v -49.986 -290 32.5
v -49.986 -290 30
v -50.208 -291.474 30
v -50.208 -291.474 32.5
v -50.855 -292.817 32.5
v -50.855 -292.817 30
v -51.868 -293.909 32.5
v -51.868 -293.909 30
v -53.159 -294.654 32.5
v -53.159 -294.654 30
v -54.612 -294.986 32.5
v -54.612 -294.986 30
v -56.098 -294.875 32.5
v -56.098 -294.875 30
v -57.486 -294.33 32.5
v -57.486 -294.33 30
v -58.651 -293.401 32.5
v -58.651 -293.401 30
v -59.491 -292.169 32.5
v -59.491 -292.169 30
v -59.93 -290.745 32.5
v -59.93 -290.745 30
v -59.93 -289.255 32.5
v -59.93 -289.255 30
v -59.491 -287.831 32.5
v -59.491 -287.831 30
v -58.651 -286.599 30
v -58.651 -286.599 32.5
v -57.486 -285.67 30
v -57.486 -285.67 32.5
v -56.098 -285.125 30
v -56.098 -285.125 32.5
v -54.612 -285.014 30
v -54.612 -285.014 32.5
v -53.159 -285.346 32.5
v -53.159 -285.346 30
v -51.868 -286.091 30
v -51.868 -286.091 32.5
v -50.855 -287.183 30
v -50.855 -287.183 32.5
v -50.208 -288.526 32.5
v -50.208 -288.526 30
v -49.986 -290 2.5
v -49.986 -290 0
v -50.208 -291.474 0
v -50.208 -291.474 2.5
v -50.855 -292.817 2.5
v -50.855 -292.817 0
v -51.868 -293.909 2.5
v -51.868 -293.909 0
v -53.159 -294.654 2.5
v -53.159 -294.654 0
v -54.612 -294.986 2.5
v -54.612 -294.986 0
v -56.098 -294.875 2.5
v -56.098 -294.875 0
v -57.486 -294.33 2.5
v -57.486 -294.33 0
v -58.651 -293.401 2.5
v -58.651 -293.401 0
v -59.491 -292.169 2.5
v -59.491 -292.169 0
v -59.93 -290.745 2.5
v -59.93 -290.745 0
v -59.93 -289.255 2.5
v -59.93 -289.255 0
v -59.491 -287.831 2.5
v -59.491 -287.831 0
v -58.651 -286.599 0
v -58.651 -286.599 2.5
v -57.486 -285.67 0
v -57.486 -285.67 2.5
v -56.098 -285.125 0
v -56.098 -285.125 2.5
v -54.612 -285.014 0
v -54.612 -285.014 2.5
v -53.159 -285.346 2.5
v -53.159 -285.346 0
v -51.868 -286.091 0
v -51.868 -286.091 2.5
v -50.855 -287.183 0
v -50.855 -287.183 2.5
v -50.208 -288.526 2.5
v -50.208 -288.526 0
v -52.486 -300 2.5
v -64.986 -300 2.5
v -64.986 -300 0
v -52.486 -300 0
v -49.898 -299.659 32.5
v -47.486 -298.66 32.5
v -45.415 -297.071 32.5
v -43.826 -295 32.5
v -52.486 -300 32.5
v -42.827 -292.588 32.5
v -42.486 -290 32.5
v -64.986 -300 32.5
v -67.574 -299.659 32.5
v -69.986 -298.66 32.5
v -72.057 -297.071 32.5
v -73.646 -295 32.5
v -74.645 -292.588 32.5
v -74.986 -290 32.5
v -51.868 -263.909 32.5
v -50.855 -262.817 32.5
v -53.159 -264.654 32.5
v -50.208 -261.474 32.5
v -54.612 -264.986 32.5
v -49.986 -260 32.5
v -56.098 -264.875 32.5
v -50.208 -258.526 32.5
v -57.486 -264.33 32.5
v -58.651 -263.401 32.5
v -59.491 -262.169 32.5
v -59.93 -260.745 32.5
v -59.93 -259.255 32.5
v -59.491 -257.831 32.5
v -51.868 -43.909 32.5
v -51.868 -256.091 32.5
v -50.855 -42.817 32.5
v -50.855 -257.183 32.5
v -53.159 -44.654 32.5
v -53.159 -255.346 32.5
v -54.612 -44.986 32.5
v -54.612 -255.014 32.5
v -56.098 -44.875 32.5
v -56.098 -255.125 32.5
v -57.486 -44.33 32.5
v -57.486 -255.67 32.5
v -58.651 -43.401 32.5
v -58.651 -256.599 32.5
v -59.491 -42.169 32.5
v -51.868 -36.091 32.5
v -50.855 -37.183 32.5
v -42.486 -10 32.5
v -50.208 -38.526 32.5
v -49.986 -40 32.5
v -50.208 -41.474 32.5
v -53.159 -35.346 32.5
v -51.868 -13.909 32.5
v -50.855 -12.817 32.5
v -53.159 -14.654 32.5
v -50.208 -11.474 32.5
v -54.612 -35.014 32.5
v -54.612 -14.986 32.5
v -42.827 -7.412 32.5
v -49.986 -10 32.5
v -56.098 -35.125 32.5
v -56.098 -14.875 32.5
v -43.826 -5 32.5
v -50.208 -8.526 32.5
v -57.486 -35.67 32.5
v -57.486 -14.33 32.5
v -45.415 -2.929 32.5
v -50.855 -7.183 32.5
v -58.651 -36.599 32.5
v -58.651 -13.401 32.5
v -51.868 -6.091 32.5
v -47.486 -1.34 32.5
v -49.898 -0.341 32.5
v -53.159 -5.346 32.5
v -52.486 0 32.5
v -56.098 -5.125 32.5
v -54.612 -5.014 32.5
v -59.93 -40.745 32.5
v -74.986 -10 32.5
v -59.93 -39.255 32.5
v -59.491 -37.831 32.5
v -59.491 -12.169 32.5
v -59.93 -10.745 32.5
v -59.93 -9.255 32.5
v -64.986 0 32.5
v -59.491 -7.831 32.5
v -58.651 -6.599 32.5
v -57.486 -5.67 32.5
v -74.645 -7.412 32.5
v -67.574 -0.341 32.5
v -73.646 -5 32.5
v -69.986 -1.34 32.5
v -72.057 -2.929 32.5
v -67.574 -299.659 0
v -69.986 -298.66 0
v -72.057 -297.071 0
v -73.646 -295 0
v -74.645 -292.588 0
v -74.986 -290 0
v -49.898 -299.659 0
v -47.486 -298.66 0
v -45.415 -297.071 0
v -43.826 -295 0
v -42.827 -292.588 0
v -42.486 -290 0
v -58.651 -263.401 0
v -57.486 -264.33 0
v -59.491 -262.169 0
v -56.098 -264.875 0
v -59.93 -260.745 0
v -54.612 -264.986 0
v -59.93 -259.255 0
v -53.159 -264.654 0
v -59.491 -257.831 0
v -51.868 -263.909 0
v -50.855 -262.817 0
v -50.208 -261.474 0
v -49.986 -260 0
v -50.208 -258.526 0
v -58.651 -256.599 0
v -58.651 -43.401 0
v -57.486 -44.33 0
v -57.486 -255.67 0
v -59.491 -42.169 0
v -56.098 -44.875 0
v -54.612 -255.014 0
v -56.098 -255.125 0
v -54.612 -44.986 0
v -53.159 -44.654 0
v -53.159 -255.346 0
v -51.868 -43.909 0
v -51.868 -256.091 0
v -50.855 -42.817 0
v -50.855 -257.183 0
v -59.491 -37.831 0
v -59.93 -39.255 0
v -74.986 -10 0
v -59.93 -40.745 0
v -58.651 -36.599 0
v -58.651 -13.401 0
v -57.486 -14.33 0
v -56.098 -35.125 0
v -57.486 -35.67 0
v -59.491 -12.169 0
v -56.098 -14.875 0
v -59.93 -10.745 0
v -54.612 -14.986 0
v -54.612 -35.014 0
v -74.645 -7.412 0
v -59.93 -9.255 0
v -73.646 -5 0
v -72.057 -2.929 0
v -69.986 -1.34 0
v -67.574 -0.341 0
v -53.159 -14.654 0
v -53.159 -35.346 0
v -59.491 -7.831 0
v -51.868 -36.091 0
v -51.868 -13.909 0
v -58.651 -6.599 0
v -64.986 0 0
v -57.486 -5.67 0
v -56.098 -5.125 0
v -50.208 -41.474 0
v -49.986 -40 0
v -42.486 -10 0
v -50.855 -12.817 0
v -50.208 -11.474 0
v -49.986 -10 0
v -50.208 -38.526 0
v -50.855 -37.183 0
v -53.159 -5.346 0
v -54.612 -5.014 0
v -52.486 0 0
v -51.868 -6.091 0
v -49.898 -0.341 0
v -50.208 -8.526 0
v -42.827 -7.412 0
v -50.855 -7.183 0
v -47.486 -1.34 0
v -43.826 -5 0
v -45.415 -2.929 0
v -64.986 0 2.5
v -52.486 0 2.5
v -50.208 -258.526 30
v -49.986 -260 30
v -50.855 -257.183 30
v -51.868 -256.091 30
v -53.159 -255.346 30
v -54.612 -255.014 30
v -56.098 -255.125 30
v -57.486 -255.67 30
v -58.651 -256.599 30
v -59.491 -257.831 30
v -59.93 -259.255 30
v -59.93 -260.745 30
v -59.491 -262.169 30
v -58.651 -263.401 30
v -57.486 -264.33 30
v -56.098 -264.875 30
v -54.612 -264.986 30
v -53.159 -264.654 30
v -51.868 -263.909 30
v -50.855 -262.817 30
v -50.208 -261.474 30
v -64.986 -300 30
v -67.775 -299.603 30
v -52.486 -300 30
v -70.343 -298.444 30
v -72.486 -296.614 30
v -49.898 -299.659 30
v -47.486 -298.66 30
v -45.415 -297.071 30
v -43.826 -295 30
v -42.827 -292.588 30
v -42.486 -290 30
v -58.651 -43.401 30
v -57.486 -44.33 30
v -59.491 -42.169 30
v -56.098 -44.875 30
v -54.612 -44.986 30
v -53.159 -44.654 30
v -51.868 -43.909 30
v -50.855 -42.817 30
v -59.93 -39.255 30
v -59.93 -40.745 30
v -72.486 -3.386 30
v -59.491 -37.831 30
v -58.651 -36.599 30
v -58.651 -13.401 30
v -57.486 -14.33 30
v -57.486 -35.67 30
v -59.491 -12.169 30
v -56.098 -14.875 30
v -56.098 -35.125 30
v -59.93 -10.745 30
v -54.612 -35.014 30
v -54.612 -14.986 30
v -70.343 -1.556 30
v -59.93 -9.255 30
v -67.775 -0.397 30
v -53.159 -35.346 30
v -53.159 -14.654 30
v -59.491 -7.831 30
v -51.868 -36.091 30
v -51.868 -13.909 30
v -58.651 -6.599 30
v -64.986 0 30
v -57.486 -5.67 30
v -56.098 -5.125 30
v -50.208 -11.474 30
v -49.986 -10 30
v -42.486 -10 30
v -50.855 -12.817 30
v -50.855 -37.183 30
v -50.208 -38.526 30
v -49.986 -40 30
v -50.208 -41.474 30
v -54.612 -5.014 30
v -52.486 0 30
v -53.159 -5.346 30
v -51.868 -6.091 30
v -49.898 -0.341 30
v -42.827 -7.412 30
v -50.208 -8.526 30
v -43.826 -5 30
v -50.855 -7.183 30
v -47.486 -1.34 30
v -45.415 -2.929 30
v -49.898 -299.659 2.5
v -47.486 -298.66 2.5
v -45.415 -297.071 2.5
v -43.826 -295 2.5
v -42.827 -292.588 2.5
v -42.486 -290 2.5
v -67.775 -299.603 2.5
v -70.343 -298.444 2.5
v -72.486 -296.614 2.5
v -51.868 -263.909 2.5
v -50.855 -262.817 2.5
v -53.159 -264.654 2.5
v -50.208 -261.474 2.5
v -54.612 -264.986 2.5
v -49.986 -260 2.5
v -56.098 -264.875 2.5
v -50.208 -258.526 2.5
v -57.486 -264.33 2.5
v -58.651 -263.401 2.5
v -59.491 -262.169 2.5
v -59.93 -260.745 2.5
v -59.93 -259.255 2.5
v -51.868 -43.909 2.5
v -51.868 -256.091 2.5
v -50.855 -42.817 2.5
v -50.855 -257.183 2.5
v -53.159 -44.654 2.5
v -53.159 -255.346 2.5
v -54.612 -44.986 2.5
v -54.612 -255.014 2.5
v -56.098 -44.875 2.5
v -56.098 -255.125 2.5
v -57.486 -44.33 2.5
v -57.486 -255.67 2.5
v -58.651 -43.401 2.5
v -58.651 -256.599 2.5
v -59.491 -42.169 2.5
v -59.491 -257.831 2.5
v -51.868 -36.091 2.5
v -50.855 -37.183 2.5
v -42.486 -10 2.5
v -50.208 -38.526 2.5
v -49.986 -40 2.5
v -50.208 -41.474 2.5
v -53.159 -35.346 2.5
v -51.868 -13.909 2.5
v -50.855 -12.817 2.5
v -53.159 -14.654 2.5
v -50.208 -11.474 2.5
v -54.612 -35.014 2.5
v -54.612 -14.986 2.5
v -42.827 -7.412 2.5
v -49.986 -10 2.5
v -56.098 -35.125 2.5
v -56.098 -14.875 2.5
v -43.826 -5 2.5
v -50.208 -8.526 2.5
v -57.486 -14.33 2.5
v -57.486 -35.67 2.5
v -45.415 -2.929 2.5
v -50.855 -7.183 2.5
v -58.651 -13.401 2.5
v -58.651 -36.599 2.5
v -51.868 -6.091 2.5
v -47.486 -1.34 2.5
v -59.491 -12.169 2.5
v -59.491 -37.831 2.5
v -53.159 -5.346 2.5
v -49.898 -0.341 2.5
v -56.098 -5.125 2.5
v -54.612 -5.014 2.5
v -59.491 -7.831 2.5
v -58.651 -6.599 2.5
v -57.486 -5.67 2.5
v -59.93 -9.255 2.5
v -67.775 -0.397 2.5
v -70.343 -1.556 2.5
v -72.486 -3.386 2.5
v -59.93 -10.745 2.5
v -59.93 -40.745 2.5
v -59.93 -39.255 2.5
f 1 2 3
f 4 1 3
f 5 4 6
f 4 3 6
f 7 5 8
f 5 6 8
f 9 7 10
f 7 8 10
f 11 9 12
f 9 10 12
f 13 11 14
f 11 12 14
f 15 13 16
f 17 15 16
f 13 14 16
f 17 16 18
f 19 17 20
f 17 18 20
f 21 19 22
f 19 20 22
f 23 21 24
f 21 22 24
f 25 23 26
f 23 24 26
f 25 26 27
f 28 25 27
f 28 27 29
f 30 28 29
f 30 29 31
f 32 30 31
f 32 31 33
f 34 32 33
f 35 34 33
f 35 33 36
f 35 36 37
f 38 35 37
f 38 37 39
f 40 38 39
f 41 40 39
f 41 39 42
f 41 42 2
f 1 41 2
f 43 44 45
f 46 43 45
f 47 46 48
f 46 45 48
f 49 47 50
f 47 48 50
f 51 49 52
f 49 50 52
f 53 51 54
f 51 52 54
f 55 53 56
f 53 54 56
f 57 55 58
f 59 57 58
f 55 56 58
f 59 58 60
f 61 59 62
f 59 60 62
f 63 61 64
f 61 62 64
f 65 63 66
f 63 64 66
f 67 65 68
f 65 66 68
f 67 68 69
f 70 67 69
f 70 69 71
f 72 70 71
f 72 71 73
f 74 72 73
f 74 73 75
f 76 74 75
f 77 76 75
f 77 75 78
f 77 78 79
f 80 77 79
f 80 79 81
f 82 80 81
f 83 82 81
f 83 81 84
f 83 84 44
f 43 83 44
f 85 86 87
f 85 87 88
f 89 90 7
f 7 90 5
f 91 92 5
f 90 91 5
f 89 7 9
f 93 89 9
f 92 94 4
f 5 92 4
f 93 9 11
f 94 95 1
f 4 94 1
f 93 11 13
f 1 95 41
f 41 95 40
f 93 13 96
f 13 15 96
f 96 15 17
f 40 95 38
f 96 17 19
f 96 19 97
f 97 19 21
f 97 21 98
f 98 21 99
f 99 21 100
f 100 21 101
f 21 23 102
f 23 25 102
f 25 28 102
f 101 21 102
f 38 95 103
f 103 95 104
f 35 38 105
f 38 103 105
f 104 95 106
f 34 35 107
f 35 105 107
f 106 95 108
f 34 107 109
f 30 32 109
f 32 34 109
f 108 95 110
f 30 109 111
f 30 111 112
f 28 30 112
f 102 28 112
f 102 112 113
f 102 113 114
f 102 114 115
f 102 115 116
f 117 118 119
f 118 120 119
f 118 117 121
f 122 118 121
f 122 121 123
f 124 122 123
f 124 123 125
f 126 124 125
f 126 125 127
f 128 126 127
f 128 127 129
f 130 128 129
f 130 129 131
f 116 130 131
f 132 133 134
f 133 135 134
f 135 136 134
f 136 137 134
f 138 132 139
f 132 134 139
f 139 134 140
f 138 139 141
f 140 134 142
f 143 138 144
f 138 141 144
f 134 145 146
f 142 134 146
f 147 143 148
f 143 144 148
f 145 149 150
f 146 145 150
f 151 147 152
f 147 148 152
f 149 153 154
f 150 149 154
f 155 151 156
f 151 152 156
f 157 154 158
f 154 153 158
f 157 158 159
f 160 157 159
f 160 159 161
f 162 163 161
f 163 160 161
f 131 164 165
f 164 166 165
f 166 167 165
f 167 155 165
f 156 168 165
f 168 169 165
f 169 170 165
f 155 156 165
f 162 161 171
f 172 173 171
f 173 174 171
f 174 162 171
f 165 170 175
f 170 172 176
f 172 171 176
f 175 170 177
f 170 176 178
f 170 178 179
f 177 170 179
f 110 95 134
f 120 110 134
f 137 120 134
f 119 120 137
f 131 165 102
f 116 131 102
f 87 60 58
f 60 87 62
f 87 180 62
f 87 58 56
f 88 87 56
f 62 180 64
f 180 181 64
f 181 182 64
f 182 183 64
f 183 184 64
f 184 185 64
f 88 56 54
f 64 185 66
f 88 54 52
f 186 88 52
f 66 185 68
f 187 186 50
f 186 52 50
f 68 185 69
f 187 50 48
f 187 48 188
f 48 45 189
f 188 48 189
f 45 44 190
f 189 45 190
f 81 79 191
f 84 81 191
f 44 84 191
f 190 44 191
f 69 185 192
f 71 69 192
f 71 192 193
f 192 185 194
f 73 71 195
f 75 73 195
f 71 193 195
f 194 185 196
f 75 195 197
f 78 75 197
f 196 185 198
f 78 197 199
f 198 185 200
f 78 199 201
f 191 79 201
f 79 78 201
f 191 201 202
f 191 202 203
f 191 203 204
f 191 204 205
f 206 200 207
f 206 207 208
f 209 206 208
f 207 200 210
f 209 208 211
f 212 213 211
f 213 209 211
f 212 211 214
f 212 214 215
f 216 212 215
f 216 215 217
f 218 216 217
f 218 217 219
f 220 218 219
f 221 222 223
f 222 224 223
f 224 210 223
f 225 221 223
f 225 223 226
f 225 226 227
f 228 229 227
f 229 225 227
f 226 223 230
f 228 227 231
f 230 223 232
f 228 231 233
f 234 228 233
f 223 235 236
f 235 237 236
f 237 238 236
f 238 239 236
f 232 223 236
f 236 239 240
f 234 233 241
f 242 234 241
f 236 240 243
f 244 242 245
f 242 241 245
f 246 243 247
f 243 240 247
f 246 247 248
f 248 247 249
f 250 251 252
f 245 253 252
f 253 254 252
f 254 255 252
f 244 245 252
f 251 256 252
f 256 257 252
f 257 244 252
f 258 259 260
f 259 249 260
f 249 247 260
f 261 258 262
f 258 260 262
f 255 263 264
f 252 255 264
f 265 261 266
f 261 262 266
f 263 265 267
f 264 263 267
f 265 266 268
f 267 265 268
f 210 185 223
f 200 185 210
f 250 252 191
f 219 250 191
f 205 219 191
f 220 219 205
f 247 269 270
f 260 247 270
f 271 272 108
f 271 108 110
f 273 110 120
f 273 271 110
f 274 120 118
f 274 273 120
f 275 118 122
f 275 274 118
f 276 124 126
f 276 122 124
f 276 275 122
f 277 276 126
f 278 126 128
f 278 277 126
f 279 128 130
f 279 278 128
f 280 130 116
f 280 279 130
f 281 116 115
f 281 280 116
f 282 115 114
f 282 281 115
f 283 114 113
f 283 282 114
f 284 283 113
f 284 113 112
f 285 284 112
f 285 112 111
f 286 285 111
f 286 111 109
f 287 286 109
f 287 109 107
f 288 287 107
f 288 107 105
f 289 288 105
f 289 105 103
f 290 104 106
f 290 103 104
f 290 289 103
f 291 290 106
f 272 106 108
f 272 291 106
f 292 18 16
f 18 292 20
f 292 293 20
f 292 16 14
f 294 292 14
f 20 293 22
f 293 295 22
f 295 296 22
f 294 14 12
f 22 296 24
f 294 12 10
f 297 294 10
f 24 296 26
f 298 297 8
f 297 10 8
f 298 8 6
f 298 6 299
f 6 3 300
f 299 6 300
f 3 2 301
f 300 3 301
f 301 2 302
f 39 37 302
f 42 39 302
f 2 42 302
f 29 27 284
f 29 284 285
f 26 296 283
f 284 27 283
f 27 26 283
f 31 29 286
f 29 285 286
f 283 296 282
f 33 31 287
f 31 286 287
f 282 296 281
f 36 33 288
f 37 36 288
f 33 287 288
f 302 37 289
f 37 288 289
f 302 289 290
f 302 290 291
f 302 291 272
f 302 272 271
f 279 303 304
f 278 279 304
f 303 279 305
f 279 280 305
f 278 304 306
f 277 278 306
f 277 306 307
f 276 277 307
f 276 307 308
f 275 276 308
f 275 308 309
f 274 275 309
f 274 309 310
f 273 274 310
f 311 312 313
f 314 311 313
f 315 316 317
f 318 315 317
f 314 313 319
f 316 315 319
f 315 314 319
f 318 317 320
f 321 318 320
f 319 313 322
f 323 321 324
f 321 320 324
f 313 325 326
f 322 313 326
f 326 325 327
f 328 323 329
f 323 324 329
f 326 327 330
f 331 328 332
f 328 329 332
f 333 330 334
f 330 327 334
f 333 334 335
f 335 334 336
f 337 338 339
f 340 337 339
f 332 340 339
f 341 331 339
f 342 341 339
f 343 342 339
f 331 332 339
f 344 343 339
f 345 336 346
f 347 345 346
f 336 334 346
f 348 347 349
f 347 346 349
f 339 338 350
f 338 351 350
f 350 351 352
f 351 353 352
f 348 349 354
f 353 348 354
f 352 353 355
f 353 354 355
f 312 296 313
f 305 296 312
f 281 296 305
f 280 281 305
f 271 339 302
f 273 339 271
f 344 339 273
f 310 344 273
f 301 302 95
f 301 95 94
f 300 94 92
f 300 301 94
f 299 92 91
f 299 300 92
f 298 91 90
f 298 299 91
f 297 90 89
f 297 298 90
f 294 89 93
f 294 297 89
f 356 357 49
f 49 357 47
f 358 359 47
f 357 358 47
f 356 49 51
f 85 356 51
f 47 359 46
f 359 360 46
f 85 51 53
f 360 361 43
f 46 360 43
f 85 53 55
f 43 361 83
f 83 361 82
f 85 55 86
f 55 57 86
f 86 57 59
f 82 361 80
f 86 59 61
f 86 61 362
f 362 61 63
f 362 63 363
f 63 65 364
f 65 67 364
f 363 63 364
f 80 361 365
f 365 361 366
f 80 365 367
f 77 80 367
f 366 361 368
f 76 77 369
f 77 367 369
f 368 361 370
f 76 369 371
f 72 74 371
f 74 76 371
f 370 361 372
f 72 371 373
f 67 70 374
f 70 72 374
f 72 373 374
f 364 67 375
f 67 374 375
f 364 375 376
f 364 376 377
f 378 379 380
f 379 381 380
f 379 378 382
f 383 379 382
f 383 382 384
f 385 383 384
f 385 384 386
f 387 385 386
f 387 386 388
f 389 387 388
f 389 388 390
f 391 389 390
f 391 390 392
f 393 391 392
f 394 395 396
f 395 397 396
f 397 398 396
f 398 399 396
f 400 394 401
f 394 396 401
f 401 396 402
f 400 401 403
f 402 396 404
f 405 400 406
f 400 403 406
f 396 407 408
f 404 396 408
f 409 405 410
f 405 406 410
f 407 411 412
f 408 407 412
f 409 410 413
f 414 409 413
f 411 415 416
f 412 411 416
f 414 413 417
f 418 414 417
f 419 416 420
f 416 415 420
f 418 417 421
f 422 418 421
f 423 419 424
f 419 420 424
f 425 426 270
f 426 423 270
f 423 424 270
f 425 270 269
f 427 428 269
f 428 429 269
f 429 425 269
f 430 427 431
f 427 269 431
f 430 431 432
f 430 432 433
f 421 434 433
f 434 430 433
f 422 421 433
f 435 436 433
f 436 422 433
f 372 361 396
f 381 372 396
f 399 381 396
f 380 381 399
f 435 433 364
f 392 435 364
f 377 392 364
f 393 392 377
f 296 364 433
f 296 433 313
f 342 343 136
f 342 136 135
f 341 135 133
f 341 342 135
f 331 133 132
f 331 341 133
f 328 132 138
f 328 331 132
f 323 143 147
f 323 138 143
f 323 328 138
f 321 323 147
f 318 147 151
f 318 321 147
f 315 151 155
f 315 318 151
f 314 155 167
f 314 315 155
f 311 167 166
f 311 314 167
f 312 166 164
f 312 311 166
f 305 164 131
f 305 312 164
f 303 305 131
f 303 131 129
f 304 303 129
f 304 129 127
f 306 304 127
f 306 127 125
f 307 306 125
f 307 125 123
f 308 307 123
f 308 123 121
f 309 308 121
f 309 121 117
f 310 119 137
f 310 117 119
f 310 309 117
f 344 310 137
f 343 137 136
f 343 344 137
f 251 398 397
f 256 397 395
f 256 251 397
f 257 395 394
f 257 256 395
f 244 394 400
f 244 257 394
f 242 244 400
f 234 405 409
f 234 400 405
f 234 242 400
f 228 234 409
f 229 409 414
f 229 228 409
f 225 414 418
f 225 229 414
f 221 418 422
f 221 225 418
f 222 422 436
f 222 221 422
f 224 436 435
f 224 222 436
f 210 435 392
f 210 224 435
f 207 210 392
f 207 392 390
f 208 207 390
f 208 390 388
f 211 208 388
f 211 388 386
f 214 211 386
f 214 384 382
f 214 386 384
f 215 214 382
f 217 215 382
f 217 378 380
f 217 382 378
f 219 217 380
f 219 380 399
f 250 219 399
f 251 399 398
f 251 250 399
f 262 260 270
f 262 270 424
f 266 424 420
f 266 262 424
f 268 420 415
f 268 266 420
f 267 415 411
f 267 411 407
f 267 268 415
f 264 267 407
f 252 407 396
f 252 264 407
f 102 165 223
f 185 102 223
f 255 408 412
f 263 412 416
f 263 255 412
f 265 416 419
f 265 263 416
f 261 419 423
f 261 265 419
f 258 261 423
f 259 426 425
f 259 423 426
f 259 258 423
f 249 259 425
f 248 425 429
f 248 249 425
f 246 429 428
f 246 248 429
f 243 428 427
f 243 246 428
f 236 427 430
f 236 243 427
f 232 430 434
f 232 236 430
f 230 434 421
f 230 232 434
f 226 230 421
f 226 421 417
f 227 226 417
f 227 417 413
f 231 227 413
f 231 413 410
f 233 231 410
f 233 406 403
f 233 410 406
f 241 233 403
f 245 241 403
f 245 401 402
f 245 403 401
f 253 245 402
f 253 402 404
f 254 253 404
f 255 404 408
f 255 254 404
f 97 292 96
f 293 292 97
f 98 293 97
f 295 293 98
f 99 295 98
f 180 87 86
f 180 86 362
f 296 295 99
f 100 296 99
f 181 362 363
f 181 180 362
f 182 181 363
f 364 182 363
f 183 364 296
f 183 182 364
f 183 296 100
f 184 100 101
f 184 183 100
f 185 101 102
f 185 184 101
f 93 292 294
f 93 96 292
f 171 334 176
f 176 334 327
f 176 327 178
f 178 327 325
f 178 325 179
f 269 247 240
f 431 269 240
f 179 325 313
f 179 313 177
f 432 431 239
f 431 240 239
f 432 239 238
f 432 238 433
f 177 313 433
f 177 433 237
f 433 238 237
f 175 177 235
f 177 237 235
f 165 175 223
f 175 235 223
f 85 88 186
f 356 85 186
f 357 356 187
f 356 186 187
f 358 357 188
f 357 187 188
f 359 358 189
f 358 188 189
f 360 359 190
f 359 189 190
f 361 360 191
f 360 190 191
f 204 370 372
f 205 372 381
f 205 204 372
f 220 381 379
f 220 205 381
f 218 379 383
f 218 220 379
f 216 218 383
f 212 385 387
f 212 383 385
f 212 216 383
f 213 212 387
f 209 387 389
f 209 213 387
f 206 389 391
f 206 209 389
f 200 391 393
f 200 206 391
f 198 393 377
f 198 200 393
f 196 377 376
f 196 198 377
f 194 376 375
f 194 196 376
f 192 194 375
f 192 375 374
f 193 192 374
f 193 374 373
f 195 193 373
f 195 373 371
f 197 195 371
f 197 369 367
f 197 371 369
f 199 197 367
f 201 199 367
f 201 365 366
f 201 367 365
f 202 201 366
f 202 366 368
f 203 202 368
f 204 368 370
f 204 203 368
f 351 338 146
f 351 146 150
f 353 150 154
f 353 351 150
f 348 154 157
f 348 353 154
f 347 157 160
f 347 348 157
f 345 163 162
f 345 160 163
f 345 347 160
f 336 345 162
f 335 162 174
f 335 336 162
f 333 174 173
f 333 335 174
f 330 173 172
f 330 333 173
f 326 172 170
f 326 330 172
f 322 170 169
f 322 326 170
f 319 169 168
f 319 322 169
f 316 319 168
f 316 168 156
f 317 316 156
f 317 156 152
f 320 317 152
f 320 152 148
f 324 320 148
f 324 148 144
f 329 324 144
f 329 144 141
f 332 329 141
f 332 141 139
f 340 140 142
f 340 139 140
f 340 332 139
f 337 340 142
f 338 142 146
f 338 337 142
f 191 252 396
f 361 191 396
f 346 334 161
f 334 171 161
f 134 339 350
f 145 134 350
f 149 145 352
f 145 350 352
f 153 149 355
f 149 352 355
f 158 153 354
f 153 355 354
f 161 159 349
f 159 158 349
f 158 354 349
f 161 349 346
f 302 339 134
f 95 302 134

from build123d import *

# Parameters (mm, degrees)
F2_DEPTH    = 300
F1_R        = 5
F3_DEPTH    = 46
F4_T1_DEPTH = 52.5
F4_T3_DEPTH = 52.5
F4_T5_DEPTH = 82.5


# Not quite as in the source:
# - a fillet or chamfer that OpenCascade refuses, or shapes differently, is made with other operations: its cross-section is extruded or revolved along the edge and cut away or added
# - a pattern or mirror of a feature is missing from the dataset's text; its kind, count and spacing are read off the source's solid


with BuildPart() as f2:
    # F0 (on Front) → F2 (new body)
    with BuildSketch(Plane.XZ):
        Polygon((-74.9858543277, 32.5), (-74.9858543277, 0), (-42.4858543277, 0), (-42.4858543277, 2.5), (-72.4858543277, 2.5), (-72.4858543277, 30), (-42.4858543277, 30), (-42.4858543277, 32.5), align=None)
    extrude(amount=F2_DEPTH)

    # F1 (on Top) → F3 (cut)
    with BuildSketch(Plane.XY):
        with Locations((-54.9858543277, -260)):
            Circle(F1_R)
        with Locations((-54.9858543277, -40)):
            Circle(F1_R)
        with Locations((-54.9858543277, -10)):
            Circle(F1_R)
    f3 = extrude(amount=F3_DEPTH, mode=Mode.SUBTRACT)

    # F3_copies: F3 across plane
    add(f3.mirror(Plane(origin=(0, -275, 0), x_dir=(0, 0, -1), z_dir=(0, -1, 0))), mode=Mode.SUBTRACT)

    # F4: fillet of radius 10 on 6 edges, made by hand

    # F4_s2 → F4_t1 (cut)
    with BuildSketch(Plane.XY.offset(-25)):
        with BuildLine():
            ThreePointArc((-52.4858543277, 0), (-45.4147865158, -2.9289321881), (-42.4858543277, -10))
            Line((-42.4858543277, -10), (-42.4858543277, 0))
            Line((-42.4858543277, 0), (-52.4858543277, 0))
        make_face()
        with BuildLine():
            ThreePointArc((-52.4858543277, -300), (-45.4147865158, -297.0710678119), (-42.4858543277, -290))
            Line((-42.4858543277, -290), (-42.4858543277, -300))
            Line((-42.4858543277, -300), (-52.4858543277, -300))
        make_face()
    extrude(amount=F4_T1_DEPTH, mode=Mode.SUBTRACT)

    # F4_s4 → F4_t3 (cut)
    with BuildSketch(Plane.XY.offset(5)):
        with BuildLine():
            ThreePointArc((-42.4858543277, -10), (-45.4147865158, -2.9289321881), (-52.4858543277, 0))
            Line((-52.4858543277, 0), (-42.4858543277, 0))
            Line((-42.4858543277, 0), (-42.4858543277, -10))
        make_face()
        with BuildLine():
            ThreePointArc((-42.4858543277, -290), (-45.4147865158, -297.0710678119), (-52.4858543277, -300))
            Line((-52.4858543277, -300), (-42.4858543277, -300))
            Line((-42.4858543277, -300), (-42.4858543277, -290))
        make_face()
    extrude(amount=F4_T3_DEPTH, mode=Mode.SUBTRACT)

    # F4_s6 → F4_t5 (cut)
    with BuildSketch(Plane.XY.offset(-25)):
        with BuildLine():
            ThreePointArc((-64.9858543277, 0), (-72.0569221395, -2.9289321881), (-74.9858543277, -10))
            Line((-74.9858543277, -10), (-74.9858543277, 0))
            Line((-74.9858543277, 0), (-64.9858543277, 0))
        make_face()
        with BuildLine():
            ThreePointArc((-64.9858543277, -300), (-72.0569221395, -297.0710678119), (-74.9858543277, -290))
            Line((-74.9858543277, -290), (-74.9858543277, -300))
            Line((-74.9858543277, -300), (-64.9858543277, -300))
        make_face()
    extrude(amount=F4_T5_DEPTH, mode=Mode.SUBTRACT)


solid = f2.part
